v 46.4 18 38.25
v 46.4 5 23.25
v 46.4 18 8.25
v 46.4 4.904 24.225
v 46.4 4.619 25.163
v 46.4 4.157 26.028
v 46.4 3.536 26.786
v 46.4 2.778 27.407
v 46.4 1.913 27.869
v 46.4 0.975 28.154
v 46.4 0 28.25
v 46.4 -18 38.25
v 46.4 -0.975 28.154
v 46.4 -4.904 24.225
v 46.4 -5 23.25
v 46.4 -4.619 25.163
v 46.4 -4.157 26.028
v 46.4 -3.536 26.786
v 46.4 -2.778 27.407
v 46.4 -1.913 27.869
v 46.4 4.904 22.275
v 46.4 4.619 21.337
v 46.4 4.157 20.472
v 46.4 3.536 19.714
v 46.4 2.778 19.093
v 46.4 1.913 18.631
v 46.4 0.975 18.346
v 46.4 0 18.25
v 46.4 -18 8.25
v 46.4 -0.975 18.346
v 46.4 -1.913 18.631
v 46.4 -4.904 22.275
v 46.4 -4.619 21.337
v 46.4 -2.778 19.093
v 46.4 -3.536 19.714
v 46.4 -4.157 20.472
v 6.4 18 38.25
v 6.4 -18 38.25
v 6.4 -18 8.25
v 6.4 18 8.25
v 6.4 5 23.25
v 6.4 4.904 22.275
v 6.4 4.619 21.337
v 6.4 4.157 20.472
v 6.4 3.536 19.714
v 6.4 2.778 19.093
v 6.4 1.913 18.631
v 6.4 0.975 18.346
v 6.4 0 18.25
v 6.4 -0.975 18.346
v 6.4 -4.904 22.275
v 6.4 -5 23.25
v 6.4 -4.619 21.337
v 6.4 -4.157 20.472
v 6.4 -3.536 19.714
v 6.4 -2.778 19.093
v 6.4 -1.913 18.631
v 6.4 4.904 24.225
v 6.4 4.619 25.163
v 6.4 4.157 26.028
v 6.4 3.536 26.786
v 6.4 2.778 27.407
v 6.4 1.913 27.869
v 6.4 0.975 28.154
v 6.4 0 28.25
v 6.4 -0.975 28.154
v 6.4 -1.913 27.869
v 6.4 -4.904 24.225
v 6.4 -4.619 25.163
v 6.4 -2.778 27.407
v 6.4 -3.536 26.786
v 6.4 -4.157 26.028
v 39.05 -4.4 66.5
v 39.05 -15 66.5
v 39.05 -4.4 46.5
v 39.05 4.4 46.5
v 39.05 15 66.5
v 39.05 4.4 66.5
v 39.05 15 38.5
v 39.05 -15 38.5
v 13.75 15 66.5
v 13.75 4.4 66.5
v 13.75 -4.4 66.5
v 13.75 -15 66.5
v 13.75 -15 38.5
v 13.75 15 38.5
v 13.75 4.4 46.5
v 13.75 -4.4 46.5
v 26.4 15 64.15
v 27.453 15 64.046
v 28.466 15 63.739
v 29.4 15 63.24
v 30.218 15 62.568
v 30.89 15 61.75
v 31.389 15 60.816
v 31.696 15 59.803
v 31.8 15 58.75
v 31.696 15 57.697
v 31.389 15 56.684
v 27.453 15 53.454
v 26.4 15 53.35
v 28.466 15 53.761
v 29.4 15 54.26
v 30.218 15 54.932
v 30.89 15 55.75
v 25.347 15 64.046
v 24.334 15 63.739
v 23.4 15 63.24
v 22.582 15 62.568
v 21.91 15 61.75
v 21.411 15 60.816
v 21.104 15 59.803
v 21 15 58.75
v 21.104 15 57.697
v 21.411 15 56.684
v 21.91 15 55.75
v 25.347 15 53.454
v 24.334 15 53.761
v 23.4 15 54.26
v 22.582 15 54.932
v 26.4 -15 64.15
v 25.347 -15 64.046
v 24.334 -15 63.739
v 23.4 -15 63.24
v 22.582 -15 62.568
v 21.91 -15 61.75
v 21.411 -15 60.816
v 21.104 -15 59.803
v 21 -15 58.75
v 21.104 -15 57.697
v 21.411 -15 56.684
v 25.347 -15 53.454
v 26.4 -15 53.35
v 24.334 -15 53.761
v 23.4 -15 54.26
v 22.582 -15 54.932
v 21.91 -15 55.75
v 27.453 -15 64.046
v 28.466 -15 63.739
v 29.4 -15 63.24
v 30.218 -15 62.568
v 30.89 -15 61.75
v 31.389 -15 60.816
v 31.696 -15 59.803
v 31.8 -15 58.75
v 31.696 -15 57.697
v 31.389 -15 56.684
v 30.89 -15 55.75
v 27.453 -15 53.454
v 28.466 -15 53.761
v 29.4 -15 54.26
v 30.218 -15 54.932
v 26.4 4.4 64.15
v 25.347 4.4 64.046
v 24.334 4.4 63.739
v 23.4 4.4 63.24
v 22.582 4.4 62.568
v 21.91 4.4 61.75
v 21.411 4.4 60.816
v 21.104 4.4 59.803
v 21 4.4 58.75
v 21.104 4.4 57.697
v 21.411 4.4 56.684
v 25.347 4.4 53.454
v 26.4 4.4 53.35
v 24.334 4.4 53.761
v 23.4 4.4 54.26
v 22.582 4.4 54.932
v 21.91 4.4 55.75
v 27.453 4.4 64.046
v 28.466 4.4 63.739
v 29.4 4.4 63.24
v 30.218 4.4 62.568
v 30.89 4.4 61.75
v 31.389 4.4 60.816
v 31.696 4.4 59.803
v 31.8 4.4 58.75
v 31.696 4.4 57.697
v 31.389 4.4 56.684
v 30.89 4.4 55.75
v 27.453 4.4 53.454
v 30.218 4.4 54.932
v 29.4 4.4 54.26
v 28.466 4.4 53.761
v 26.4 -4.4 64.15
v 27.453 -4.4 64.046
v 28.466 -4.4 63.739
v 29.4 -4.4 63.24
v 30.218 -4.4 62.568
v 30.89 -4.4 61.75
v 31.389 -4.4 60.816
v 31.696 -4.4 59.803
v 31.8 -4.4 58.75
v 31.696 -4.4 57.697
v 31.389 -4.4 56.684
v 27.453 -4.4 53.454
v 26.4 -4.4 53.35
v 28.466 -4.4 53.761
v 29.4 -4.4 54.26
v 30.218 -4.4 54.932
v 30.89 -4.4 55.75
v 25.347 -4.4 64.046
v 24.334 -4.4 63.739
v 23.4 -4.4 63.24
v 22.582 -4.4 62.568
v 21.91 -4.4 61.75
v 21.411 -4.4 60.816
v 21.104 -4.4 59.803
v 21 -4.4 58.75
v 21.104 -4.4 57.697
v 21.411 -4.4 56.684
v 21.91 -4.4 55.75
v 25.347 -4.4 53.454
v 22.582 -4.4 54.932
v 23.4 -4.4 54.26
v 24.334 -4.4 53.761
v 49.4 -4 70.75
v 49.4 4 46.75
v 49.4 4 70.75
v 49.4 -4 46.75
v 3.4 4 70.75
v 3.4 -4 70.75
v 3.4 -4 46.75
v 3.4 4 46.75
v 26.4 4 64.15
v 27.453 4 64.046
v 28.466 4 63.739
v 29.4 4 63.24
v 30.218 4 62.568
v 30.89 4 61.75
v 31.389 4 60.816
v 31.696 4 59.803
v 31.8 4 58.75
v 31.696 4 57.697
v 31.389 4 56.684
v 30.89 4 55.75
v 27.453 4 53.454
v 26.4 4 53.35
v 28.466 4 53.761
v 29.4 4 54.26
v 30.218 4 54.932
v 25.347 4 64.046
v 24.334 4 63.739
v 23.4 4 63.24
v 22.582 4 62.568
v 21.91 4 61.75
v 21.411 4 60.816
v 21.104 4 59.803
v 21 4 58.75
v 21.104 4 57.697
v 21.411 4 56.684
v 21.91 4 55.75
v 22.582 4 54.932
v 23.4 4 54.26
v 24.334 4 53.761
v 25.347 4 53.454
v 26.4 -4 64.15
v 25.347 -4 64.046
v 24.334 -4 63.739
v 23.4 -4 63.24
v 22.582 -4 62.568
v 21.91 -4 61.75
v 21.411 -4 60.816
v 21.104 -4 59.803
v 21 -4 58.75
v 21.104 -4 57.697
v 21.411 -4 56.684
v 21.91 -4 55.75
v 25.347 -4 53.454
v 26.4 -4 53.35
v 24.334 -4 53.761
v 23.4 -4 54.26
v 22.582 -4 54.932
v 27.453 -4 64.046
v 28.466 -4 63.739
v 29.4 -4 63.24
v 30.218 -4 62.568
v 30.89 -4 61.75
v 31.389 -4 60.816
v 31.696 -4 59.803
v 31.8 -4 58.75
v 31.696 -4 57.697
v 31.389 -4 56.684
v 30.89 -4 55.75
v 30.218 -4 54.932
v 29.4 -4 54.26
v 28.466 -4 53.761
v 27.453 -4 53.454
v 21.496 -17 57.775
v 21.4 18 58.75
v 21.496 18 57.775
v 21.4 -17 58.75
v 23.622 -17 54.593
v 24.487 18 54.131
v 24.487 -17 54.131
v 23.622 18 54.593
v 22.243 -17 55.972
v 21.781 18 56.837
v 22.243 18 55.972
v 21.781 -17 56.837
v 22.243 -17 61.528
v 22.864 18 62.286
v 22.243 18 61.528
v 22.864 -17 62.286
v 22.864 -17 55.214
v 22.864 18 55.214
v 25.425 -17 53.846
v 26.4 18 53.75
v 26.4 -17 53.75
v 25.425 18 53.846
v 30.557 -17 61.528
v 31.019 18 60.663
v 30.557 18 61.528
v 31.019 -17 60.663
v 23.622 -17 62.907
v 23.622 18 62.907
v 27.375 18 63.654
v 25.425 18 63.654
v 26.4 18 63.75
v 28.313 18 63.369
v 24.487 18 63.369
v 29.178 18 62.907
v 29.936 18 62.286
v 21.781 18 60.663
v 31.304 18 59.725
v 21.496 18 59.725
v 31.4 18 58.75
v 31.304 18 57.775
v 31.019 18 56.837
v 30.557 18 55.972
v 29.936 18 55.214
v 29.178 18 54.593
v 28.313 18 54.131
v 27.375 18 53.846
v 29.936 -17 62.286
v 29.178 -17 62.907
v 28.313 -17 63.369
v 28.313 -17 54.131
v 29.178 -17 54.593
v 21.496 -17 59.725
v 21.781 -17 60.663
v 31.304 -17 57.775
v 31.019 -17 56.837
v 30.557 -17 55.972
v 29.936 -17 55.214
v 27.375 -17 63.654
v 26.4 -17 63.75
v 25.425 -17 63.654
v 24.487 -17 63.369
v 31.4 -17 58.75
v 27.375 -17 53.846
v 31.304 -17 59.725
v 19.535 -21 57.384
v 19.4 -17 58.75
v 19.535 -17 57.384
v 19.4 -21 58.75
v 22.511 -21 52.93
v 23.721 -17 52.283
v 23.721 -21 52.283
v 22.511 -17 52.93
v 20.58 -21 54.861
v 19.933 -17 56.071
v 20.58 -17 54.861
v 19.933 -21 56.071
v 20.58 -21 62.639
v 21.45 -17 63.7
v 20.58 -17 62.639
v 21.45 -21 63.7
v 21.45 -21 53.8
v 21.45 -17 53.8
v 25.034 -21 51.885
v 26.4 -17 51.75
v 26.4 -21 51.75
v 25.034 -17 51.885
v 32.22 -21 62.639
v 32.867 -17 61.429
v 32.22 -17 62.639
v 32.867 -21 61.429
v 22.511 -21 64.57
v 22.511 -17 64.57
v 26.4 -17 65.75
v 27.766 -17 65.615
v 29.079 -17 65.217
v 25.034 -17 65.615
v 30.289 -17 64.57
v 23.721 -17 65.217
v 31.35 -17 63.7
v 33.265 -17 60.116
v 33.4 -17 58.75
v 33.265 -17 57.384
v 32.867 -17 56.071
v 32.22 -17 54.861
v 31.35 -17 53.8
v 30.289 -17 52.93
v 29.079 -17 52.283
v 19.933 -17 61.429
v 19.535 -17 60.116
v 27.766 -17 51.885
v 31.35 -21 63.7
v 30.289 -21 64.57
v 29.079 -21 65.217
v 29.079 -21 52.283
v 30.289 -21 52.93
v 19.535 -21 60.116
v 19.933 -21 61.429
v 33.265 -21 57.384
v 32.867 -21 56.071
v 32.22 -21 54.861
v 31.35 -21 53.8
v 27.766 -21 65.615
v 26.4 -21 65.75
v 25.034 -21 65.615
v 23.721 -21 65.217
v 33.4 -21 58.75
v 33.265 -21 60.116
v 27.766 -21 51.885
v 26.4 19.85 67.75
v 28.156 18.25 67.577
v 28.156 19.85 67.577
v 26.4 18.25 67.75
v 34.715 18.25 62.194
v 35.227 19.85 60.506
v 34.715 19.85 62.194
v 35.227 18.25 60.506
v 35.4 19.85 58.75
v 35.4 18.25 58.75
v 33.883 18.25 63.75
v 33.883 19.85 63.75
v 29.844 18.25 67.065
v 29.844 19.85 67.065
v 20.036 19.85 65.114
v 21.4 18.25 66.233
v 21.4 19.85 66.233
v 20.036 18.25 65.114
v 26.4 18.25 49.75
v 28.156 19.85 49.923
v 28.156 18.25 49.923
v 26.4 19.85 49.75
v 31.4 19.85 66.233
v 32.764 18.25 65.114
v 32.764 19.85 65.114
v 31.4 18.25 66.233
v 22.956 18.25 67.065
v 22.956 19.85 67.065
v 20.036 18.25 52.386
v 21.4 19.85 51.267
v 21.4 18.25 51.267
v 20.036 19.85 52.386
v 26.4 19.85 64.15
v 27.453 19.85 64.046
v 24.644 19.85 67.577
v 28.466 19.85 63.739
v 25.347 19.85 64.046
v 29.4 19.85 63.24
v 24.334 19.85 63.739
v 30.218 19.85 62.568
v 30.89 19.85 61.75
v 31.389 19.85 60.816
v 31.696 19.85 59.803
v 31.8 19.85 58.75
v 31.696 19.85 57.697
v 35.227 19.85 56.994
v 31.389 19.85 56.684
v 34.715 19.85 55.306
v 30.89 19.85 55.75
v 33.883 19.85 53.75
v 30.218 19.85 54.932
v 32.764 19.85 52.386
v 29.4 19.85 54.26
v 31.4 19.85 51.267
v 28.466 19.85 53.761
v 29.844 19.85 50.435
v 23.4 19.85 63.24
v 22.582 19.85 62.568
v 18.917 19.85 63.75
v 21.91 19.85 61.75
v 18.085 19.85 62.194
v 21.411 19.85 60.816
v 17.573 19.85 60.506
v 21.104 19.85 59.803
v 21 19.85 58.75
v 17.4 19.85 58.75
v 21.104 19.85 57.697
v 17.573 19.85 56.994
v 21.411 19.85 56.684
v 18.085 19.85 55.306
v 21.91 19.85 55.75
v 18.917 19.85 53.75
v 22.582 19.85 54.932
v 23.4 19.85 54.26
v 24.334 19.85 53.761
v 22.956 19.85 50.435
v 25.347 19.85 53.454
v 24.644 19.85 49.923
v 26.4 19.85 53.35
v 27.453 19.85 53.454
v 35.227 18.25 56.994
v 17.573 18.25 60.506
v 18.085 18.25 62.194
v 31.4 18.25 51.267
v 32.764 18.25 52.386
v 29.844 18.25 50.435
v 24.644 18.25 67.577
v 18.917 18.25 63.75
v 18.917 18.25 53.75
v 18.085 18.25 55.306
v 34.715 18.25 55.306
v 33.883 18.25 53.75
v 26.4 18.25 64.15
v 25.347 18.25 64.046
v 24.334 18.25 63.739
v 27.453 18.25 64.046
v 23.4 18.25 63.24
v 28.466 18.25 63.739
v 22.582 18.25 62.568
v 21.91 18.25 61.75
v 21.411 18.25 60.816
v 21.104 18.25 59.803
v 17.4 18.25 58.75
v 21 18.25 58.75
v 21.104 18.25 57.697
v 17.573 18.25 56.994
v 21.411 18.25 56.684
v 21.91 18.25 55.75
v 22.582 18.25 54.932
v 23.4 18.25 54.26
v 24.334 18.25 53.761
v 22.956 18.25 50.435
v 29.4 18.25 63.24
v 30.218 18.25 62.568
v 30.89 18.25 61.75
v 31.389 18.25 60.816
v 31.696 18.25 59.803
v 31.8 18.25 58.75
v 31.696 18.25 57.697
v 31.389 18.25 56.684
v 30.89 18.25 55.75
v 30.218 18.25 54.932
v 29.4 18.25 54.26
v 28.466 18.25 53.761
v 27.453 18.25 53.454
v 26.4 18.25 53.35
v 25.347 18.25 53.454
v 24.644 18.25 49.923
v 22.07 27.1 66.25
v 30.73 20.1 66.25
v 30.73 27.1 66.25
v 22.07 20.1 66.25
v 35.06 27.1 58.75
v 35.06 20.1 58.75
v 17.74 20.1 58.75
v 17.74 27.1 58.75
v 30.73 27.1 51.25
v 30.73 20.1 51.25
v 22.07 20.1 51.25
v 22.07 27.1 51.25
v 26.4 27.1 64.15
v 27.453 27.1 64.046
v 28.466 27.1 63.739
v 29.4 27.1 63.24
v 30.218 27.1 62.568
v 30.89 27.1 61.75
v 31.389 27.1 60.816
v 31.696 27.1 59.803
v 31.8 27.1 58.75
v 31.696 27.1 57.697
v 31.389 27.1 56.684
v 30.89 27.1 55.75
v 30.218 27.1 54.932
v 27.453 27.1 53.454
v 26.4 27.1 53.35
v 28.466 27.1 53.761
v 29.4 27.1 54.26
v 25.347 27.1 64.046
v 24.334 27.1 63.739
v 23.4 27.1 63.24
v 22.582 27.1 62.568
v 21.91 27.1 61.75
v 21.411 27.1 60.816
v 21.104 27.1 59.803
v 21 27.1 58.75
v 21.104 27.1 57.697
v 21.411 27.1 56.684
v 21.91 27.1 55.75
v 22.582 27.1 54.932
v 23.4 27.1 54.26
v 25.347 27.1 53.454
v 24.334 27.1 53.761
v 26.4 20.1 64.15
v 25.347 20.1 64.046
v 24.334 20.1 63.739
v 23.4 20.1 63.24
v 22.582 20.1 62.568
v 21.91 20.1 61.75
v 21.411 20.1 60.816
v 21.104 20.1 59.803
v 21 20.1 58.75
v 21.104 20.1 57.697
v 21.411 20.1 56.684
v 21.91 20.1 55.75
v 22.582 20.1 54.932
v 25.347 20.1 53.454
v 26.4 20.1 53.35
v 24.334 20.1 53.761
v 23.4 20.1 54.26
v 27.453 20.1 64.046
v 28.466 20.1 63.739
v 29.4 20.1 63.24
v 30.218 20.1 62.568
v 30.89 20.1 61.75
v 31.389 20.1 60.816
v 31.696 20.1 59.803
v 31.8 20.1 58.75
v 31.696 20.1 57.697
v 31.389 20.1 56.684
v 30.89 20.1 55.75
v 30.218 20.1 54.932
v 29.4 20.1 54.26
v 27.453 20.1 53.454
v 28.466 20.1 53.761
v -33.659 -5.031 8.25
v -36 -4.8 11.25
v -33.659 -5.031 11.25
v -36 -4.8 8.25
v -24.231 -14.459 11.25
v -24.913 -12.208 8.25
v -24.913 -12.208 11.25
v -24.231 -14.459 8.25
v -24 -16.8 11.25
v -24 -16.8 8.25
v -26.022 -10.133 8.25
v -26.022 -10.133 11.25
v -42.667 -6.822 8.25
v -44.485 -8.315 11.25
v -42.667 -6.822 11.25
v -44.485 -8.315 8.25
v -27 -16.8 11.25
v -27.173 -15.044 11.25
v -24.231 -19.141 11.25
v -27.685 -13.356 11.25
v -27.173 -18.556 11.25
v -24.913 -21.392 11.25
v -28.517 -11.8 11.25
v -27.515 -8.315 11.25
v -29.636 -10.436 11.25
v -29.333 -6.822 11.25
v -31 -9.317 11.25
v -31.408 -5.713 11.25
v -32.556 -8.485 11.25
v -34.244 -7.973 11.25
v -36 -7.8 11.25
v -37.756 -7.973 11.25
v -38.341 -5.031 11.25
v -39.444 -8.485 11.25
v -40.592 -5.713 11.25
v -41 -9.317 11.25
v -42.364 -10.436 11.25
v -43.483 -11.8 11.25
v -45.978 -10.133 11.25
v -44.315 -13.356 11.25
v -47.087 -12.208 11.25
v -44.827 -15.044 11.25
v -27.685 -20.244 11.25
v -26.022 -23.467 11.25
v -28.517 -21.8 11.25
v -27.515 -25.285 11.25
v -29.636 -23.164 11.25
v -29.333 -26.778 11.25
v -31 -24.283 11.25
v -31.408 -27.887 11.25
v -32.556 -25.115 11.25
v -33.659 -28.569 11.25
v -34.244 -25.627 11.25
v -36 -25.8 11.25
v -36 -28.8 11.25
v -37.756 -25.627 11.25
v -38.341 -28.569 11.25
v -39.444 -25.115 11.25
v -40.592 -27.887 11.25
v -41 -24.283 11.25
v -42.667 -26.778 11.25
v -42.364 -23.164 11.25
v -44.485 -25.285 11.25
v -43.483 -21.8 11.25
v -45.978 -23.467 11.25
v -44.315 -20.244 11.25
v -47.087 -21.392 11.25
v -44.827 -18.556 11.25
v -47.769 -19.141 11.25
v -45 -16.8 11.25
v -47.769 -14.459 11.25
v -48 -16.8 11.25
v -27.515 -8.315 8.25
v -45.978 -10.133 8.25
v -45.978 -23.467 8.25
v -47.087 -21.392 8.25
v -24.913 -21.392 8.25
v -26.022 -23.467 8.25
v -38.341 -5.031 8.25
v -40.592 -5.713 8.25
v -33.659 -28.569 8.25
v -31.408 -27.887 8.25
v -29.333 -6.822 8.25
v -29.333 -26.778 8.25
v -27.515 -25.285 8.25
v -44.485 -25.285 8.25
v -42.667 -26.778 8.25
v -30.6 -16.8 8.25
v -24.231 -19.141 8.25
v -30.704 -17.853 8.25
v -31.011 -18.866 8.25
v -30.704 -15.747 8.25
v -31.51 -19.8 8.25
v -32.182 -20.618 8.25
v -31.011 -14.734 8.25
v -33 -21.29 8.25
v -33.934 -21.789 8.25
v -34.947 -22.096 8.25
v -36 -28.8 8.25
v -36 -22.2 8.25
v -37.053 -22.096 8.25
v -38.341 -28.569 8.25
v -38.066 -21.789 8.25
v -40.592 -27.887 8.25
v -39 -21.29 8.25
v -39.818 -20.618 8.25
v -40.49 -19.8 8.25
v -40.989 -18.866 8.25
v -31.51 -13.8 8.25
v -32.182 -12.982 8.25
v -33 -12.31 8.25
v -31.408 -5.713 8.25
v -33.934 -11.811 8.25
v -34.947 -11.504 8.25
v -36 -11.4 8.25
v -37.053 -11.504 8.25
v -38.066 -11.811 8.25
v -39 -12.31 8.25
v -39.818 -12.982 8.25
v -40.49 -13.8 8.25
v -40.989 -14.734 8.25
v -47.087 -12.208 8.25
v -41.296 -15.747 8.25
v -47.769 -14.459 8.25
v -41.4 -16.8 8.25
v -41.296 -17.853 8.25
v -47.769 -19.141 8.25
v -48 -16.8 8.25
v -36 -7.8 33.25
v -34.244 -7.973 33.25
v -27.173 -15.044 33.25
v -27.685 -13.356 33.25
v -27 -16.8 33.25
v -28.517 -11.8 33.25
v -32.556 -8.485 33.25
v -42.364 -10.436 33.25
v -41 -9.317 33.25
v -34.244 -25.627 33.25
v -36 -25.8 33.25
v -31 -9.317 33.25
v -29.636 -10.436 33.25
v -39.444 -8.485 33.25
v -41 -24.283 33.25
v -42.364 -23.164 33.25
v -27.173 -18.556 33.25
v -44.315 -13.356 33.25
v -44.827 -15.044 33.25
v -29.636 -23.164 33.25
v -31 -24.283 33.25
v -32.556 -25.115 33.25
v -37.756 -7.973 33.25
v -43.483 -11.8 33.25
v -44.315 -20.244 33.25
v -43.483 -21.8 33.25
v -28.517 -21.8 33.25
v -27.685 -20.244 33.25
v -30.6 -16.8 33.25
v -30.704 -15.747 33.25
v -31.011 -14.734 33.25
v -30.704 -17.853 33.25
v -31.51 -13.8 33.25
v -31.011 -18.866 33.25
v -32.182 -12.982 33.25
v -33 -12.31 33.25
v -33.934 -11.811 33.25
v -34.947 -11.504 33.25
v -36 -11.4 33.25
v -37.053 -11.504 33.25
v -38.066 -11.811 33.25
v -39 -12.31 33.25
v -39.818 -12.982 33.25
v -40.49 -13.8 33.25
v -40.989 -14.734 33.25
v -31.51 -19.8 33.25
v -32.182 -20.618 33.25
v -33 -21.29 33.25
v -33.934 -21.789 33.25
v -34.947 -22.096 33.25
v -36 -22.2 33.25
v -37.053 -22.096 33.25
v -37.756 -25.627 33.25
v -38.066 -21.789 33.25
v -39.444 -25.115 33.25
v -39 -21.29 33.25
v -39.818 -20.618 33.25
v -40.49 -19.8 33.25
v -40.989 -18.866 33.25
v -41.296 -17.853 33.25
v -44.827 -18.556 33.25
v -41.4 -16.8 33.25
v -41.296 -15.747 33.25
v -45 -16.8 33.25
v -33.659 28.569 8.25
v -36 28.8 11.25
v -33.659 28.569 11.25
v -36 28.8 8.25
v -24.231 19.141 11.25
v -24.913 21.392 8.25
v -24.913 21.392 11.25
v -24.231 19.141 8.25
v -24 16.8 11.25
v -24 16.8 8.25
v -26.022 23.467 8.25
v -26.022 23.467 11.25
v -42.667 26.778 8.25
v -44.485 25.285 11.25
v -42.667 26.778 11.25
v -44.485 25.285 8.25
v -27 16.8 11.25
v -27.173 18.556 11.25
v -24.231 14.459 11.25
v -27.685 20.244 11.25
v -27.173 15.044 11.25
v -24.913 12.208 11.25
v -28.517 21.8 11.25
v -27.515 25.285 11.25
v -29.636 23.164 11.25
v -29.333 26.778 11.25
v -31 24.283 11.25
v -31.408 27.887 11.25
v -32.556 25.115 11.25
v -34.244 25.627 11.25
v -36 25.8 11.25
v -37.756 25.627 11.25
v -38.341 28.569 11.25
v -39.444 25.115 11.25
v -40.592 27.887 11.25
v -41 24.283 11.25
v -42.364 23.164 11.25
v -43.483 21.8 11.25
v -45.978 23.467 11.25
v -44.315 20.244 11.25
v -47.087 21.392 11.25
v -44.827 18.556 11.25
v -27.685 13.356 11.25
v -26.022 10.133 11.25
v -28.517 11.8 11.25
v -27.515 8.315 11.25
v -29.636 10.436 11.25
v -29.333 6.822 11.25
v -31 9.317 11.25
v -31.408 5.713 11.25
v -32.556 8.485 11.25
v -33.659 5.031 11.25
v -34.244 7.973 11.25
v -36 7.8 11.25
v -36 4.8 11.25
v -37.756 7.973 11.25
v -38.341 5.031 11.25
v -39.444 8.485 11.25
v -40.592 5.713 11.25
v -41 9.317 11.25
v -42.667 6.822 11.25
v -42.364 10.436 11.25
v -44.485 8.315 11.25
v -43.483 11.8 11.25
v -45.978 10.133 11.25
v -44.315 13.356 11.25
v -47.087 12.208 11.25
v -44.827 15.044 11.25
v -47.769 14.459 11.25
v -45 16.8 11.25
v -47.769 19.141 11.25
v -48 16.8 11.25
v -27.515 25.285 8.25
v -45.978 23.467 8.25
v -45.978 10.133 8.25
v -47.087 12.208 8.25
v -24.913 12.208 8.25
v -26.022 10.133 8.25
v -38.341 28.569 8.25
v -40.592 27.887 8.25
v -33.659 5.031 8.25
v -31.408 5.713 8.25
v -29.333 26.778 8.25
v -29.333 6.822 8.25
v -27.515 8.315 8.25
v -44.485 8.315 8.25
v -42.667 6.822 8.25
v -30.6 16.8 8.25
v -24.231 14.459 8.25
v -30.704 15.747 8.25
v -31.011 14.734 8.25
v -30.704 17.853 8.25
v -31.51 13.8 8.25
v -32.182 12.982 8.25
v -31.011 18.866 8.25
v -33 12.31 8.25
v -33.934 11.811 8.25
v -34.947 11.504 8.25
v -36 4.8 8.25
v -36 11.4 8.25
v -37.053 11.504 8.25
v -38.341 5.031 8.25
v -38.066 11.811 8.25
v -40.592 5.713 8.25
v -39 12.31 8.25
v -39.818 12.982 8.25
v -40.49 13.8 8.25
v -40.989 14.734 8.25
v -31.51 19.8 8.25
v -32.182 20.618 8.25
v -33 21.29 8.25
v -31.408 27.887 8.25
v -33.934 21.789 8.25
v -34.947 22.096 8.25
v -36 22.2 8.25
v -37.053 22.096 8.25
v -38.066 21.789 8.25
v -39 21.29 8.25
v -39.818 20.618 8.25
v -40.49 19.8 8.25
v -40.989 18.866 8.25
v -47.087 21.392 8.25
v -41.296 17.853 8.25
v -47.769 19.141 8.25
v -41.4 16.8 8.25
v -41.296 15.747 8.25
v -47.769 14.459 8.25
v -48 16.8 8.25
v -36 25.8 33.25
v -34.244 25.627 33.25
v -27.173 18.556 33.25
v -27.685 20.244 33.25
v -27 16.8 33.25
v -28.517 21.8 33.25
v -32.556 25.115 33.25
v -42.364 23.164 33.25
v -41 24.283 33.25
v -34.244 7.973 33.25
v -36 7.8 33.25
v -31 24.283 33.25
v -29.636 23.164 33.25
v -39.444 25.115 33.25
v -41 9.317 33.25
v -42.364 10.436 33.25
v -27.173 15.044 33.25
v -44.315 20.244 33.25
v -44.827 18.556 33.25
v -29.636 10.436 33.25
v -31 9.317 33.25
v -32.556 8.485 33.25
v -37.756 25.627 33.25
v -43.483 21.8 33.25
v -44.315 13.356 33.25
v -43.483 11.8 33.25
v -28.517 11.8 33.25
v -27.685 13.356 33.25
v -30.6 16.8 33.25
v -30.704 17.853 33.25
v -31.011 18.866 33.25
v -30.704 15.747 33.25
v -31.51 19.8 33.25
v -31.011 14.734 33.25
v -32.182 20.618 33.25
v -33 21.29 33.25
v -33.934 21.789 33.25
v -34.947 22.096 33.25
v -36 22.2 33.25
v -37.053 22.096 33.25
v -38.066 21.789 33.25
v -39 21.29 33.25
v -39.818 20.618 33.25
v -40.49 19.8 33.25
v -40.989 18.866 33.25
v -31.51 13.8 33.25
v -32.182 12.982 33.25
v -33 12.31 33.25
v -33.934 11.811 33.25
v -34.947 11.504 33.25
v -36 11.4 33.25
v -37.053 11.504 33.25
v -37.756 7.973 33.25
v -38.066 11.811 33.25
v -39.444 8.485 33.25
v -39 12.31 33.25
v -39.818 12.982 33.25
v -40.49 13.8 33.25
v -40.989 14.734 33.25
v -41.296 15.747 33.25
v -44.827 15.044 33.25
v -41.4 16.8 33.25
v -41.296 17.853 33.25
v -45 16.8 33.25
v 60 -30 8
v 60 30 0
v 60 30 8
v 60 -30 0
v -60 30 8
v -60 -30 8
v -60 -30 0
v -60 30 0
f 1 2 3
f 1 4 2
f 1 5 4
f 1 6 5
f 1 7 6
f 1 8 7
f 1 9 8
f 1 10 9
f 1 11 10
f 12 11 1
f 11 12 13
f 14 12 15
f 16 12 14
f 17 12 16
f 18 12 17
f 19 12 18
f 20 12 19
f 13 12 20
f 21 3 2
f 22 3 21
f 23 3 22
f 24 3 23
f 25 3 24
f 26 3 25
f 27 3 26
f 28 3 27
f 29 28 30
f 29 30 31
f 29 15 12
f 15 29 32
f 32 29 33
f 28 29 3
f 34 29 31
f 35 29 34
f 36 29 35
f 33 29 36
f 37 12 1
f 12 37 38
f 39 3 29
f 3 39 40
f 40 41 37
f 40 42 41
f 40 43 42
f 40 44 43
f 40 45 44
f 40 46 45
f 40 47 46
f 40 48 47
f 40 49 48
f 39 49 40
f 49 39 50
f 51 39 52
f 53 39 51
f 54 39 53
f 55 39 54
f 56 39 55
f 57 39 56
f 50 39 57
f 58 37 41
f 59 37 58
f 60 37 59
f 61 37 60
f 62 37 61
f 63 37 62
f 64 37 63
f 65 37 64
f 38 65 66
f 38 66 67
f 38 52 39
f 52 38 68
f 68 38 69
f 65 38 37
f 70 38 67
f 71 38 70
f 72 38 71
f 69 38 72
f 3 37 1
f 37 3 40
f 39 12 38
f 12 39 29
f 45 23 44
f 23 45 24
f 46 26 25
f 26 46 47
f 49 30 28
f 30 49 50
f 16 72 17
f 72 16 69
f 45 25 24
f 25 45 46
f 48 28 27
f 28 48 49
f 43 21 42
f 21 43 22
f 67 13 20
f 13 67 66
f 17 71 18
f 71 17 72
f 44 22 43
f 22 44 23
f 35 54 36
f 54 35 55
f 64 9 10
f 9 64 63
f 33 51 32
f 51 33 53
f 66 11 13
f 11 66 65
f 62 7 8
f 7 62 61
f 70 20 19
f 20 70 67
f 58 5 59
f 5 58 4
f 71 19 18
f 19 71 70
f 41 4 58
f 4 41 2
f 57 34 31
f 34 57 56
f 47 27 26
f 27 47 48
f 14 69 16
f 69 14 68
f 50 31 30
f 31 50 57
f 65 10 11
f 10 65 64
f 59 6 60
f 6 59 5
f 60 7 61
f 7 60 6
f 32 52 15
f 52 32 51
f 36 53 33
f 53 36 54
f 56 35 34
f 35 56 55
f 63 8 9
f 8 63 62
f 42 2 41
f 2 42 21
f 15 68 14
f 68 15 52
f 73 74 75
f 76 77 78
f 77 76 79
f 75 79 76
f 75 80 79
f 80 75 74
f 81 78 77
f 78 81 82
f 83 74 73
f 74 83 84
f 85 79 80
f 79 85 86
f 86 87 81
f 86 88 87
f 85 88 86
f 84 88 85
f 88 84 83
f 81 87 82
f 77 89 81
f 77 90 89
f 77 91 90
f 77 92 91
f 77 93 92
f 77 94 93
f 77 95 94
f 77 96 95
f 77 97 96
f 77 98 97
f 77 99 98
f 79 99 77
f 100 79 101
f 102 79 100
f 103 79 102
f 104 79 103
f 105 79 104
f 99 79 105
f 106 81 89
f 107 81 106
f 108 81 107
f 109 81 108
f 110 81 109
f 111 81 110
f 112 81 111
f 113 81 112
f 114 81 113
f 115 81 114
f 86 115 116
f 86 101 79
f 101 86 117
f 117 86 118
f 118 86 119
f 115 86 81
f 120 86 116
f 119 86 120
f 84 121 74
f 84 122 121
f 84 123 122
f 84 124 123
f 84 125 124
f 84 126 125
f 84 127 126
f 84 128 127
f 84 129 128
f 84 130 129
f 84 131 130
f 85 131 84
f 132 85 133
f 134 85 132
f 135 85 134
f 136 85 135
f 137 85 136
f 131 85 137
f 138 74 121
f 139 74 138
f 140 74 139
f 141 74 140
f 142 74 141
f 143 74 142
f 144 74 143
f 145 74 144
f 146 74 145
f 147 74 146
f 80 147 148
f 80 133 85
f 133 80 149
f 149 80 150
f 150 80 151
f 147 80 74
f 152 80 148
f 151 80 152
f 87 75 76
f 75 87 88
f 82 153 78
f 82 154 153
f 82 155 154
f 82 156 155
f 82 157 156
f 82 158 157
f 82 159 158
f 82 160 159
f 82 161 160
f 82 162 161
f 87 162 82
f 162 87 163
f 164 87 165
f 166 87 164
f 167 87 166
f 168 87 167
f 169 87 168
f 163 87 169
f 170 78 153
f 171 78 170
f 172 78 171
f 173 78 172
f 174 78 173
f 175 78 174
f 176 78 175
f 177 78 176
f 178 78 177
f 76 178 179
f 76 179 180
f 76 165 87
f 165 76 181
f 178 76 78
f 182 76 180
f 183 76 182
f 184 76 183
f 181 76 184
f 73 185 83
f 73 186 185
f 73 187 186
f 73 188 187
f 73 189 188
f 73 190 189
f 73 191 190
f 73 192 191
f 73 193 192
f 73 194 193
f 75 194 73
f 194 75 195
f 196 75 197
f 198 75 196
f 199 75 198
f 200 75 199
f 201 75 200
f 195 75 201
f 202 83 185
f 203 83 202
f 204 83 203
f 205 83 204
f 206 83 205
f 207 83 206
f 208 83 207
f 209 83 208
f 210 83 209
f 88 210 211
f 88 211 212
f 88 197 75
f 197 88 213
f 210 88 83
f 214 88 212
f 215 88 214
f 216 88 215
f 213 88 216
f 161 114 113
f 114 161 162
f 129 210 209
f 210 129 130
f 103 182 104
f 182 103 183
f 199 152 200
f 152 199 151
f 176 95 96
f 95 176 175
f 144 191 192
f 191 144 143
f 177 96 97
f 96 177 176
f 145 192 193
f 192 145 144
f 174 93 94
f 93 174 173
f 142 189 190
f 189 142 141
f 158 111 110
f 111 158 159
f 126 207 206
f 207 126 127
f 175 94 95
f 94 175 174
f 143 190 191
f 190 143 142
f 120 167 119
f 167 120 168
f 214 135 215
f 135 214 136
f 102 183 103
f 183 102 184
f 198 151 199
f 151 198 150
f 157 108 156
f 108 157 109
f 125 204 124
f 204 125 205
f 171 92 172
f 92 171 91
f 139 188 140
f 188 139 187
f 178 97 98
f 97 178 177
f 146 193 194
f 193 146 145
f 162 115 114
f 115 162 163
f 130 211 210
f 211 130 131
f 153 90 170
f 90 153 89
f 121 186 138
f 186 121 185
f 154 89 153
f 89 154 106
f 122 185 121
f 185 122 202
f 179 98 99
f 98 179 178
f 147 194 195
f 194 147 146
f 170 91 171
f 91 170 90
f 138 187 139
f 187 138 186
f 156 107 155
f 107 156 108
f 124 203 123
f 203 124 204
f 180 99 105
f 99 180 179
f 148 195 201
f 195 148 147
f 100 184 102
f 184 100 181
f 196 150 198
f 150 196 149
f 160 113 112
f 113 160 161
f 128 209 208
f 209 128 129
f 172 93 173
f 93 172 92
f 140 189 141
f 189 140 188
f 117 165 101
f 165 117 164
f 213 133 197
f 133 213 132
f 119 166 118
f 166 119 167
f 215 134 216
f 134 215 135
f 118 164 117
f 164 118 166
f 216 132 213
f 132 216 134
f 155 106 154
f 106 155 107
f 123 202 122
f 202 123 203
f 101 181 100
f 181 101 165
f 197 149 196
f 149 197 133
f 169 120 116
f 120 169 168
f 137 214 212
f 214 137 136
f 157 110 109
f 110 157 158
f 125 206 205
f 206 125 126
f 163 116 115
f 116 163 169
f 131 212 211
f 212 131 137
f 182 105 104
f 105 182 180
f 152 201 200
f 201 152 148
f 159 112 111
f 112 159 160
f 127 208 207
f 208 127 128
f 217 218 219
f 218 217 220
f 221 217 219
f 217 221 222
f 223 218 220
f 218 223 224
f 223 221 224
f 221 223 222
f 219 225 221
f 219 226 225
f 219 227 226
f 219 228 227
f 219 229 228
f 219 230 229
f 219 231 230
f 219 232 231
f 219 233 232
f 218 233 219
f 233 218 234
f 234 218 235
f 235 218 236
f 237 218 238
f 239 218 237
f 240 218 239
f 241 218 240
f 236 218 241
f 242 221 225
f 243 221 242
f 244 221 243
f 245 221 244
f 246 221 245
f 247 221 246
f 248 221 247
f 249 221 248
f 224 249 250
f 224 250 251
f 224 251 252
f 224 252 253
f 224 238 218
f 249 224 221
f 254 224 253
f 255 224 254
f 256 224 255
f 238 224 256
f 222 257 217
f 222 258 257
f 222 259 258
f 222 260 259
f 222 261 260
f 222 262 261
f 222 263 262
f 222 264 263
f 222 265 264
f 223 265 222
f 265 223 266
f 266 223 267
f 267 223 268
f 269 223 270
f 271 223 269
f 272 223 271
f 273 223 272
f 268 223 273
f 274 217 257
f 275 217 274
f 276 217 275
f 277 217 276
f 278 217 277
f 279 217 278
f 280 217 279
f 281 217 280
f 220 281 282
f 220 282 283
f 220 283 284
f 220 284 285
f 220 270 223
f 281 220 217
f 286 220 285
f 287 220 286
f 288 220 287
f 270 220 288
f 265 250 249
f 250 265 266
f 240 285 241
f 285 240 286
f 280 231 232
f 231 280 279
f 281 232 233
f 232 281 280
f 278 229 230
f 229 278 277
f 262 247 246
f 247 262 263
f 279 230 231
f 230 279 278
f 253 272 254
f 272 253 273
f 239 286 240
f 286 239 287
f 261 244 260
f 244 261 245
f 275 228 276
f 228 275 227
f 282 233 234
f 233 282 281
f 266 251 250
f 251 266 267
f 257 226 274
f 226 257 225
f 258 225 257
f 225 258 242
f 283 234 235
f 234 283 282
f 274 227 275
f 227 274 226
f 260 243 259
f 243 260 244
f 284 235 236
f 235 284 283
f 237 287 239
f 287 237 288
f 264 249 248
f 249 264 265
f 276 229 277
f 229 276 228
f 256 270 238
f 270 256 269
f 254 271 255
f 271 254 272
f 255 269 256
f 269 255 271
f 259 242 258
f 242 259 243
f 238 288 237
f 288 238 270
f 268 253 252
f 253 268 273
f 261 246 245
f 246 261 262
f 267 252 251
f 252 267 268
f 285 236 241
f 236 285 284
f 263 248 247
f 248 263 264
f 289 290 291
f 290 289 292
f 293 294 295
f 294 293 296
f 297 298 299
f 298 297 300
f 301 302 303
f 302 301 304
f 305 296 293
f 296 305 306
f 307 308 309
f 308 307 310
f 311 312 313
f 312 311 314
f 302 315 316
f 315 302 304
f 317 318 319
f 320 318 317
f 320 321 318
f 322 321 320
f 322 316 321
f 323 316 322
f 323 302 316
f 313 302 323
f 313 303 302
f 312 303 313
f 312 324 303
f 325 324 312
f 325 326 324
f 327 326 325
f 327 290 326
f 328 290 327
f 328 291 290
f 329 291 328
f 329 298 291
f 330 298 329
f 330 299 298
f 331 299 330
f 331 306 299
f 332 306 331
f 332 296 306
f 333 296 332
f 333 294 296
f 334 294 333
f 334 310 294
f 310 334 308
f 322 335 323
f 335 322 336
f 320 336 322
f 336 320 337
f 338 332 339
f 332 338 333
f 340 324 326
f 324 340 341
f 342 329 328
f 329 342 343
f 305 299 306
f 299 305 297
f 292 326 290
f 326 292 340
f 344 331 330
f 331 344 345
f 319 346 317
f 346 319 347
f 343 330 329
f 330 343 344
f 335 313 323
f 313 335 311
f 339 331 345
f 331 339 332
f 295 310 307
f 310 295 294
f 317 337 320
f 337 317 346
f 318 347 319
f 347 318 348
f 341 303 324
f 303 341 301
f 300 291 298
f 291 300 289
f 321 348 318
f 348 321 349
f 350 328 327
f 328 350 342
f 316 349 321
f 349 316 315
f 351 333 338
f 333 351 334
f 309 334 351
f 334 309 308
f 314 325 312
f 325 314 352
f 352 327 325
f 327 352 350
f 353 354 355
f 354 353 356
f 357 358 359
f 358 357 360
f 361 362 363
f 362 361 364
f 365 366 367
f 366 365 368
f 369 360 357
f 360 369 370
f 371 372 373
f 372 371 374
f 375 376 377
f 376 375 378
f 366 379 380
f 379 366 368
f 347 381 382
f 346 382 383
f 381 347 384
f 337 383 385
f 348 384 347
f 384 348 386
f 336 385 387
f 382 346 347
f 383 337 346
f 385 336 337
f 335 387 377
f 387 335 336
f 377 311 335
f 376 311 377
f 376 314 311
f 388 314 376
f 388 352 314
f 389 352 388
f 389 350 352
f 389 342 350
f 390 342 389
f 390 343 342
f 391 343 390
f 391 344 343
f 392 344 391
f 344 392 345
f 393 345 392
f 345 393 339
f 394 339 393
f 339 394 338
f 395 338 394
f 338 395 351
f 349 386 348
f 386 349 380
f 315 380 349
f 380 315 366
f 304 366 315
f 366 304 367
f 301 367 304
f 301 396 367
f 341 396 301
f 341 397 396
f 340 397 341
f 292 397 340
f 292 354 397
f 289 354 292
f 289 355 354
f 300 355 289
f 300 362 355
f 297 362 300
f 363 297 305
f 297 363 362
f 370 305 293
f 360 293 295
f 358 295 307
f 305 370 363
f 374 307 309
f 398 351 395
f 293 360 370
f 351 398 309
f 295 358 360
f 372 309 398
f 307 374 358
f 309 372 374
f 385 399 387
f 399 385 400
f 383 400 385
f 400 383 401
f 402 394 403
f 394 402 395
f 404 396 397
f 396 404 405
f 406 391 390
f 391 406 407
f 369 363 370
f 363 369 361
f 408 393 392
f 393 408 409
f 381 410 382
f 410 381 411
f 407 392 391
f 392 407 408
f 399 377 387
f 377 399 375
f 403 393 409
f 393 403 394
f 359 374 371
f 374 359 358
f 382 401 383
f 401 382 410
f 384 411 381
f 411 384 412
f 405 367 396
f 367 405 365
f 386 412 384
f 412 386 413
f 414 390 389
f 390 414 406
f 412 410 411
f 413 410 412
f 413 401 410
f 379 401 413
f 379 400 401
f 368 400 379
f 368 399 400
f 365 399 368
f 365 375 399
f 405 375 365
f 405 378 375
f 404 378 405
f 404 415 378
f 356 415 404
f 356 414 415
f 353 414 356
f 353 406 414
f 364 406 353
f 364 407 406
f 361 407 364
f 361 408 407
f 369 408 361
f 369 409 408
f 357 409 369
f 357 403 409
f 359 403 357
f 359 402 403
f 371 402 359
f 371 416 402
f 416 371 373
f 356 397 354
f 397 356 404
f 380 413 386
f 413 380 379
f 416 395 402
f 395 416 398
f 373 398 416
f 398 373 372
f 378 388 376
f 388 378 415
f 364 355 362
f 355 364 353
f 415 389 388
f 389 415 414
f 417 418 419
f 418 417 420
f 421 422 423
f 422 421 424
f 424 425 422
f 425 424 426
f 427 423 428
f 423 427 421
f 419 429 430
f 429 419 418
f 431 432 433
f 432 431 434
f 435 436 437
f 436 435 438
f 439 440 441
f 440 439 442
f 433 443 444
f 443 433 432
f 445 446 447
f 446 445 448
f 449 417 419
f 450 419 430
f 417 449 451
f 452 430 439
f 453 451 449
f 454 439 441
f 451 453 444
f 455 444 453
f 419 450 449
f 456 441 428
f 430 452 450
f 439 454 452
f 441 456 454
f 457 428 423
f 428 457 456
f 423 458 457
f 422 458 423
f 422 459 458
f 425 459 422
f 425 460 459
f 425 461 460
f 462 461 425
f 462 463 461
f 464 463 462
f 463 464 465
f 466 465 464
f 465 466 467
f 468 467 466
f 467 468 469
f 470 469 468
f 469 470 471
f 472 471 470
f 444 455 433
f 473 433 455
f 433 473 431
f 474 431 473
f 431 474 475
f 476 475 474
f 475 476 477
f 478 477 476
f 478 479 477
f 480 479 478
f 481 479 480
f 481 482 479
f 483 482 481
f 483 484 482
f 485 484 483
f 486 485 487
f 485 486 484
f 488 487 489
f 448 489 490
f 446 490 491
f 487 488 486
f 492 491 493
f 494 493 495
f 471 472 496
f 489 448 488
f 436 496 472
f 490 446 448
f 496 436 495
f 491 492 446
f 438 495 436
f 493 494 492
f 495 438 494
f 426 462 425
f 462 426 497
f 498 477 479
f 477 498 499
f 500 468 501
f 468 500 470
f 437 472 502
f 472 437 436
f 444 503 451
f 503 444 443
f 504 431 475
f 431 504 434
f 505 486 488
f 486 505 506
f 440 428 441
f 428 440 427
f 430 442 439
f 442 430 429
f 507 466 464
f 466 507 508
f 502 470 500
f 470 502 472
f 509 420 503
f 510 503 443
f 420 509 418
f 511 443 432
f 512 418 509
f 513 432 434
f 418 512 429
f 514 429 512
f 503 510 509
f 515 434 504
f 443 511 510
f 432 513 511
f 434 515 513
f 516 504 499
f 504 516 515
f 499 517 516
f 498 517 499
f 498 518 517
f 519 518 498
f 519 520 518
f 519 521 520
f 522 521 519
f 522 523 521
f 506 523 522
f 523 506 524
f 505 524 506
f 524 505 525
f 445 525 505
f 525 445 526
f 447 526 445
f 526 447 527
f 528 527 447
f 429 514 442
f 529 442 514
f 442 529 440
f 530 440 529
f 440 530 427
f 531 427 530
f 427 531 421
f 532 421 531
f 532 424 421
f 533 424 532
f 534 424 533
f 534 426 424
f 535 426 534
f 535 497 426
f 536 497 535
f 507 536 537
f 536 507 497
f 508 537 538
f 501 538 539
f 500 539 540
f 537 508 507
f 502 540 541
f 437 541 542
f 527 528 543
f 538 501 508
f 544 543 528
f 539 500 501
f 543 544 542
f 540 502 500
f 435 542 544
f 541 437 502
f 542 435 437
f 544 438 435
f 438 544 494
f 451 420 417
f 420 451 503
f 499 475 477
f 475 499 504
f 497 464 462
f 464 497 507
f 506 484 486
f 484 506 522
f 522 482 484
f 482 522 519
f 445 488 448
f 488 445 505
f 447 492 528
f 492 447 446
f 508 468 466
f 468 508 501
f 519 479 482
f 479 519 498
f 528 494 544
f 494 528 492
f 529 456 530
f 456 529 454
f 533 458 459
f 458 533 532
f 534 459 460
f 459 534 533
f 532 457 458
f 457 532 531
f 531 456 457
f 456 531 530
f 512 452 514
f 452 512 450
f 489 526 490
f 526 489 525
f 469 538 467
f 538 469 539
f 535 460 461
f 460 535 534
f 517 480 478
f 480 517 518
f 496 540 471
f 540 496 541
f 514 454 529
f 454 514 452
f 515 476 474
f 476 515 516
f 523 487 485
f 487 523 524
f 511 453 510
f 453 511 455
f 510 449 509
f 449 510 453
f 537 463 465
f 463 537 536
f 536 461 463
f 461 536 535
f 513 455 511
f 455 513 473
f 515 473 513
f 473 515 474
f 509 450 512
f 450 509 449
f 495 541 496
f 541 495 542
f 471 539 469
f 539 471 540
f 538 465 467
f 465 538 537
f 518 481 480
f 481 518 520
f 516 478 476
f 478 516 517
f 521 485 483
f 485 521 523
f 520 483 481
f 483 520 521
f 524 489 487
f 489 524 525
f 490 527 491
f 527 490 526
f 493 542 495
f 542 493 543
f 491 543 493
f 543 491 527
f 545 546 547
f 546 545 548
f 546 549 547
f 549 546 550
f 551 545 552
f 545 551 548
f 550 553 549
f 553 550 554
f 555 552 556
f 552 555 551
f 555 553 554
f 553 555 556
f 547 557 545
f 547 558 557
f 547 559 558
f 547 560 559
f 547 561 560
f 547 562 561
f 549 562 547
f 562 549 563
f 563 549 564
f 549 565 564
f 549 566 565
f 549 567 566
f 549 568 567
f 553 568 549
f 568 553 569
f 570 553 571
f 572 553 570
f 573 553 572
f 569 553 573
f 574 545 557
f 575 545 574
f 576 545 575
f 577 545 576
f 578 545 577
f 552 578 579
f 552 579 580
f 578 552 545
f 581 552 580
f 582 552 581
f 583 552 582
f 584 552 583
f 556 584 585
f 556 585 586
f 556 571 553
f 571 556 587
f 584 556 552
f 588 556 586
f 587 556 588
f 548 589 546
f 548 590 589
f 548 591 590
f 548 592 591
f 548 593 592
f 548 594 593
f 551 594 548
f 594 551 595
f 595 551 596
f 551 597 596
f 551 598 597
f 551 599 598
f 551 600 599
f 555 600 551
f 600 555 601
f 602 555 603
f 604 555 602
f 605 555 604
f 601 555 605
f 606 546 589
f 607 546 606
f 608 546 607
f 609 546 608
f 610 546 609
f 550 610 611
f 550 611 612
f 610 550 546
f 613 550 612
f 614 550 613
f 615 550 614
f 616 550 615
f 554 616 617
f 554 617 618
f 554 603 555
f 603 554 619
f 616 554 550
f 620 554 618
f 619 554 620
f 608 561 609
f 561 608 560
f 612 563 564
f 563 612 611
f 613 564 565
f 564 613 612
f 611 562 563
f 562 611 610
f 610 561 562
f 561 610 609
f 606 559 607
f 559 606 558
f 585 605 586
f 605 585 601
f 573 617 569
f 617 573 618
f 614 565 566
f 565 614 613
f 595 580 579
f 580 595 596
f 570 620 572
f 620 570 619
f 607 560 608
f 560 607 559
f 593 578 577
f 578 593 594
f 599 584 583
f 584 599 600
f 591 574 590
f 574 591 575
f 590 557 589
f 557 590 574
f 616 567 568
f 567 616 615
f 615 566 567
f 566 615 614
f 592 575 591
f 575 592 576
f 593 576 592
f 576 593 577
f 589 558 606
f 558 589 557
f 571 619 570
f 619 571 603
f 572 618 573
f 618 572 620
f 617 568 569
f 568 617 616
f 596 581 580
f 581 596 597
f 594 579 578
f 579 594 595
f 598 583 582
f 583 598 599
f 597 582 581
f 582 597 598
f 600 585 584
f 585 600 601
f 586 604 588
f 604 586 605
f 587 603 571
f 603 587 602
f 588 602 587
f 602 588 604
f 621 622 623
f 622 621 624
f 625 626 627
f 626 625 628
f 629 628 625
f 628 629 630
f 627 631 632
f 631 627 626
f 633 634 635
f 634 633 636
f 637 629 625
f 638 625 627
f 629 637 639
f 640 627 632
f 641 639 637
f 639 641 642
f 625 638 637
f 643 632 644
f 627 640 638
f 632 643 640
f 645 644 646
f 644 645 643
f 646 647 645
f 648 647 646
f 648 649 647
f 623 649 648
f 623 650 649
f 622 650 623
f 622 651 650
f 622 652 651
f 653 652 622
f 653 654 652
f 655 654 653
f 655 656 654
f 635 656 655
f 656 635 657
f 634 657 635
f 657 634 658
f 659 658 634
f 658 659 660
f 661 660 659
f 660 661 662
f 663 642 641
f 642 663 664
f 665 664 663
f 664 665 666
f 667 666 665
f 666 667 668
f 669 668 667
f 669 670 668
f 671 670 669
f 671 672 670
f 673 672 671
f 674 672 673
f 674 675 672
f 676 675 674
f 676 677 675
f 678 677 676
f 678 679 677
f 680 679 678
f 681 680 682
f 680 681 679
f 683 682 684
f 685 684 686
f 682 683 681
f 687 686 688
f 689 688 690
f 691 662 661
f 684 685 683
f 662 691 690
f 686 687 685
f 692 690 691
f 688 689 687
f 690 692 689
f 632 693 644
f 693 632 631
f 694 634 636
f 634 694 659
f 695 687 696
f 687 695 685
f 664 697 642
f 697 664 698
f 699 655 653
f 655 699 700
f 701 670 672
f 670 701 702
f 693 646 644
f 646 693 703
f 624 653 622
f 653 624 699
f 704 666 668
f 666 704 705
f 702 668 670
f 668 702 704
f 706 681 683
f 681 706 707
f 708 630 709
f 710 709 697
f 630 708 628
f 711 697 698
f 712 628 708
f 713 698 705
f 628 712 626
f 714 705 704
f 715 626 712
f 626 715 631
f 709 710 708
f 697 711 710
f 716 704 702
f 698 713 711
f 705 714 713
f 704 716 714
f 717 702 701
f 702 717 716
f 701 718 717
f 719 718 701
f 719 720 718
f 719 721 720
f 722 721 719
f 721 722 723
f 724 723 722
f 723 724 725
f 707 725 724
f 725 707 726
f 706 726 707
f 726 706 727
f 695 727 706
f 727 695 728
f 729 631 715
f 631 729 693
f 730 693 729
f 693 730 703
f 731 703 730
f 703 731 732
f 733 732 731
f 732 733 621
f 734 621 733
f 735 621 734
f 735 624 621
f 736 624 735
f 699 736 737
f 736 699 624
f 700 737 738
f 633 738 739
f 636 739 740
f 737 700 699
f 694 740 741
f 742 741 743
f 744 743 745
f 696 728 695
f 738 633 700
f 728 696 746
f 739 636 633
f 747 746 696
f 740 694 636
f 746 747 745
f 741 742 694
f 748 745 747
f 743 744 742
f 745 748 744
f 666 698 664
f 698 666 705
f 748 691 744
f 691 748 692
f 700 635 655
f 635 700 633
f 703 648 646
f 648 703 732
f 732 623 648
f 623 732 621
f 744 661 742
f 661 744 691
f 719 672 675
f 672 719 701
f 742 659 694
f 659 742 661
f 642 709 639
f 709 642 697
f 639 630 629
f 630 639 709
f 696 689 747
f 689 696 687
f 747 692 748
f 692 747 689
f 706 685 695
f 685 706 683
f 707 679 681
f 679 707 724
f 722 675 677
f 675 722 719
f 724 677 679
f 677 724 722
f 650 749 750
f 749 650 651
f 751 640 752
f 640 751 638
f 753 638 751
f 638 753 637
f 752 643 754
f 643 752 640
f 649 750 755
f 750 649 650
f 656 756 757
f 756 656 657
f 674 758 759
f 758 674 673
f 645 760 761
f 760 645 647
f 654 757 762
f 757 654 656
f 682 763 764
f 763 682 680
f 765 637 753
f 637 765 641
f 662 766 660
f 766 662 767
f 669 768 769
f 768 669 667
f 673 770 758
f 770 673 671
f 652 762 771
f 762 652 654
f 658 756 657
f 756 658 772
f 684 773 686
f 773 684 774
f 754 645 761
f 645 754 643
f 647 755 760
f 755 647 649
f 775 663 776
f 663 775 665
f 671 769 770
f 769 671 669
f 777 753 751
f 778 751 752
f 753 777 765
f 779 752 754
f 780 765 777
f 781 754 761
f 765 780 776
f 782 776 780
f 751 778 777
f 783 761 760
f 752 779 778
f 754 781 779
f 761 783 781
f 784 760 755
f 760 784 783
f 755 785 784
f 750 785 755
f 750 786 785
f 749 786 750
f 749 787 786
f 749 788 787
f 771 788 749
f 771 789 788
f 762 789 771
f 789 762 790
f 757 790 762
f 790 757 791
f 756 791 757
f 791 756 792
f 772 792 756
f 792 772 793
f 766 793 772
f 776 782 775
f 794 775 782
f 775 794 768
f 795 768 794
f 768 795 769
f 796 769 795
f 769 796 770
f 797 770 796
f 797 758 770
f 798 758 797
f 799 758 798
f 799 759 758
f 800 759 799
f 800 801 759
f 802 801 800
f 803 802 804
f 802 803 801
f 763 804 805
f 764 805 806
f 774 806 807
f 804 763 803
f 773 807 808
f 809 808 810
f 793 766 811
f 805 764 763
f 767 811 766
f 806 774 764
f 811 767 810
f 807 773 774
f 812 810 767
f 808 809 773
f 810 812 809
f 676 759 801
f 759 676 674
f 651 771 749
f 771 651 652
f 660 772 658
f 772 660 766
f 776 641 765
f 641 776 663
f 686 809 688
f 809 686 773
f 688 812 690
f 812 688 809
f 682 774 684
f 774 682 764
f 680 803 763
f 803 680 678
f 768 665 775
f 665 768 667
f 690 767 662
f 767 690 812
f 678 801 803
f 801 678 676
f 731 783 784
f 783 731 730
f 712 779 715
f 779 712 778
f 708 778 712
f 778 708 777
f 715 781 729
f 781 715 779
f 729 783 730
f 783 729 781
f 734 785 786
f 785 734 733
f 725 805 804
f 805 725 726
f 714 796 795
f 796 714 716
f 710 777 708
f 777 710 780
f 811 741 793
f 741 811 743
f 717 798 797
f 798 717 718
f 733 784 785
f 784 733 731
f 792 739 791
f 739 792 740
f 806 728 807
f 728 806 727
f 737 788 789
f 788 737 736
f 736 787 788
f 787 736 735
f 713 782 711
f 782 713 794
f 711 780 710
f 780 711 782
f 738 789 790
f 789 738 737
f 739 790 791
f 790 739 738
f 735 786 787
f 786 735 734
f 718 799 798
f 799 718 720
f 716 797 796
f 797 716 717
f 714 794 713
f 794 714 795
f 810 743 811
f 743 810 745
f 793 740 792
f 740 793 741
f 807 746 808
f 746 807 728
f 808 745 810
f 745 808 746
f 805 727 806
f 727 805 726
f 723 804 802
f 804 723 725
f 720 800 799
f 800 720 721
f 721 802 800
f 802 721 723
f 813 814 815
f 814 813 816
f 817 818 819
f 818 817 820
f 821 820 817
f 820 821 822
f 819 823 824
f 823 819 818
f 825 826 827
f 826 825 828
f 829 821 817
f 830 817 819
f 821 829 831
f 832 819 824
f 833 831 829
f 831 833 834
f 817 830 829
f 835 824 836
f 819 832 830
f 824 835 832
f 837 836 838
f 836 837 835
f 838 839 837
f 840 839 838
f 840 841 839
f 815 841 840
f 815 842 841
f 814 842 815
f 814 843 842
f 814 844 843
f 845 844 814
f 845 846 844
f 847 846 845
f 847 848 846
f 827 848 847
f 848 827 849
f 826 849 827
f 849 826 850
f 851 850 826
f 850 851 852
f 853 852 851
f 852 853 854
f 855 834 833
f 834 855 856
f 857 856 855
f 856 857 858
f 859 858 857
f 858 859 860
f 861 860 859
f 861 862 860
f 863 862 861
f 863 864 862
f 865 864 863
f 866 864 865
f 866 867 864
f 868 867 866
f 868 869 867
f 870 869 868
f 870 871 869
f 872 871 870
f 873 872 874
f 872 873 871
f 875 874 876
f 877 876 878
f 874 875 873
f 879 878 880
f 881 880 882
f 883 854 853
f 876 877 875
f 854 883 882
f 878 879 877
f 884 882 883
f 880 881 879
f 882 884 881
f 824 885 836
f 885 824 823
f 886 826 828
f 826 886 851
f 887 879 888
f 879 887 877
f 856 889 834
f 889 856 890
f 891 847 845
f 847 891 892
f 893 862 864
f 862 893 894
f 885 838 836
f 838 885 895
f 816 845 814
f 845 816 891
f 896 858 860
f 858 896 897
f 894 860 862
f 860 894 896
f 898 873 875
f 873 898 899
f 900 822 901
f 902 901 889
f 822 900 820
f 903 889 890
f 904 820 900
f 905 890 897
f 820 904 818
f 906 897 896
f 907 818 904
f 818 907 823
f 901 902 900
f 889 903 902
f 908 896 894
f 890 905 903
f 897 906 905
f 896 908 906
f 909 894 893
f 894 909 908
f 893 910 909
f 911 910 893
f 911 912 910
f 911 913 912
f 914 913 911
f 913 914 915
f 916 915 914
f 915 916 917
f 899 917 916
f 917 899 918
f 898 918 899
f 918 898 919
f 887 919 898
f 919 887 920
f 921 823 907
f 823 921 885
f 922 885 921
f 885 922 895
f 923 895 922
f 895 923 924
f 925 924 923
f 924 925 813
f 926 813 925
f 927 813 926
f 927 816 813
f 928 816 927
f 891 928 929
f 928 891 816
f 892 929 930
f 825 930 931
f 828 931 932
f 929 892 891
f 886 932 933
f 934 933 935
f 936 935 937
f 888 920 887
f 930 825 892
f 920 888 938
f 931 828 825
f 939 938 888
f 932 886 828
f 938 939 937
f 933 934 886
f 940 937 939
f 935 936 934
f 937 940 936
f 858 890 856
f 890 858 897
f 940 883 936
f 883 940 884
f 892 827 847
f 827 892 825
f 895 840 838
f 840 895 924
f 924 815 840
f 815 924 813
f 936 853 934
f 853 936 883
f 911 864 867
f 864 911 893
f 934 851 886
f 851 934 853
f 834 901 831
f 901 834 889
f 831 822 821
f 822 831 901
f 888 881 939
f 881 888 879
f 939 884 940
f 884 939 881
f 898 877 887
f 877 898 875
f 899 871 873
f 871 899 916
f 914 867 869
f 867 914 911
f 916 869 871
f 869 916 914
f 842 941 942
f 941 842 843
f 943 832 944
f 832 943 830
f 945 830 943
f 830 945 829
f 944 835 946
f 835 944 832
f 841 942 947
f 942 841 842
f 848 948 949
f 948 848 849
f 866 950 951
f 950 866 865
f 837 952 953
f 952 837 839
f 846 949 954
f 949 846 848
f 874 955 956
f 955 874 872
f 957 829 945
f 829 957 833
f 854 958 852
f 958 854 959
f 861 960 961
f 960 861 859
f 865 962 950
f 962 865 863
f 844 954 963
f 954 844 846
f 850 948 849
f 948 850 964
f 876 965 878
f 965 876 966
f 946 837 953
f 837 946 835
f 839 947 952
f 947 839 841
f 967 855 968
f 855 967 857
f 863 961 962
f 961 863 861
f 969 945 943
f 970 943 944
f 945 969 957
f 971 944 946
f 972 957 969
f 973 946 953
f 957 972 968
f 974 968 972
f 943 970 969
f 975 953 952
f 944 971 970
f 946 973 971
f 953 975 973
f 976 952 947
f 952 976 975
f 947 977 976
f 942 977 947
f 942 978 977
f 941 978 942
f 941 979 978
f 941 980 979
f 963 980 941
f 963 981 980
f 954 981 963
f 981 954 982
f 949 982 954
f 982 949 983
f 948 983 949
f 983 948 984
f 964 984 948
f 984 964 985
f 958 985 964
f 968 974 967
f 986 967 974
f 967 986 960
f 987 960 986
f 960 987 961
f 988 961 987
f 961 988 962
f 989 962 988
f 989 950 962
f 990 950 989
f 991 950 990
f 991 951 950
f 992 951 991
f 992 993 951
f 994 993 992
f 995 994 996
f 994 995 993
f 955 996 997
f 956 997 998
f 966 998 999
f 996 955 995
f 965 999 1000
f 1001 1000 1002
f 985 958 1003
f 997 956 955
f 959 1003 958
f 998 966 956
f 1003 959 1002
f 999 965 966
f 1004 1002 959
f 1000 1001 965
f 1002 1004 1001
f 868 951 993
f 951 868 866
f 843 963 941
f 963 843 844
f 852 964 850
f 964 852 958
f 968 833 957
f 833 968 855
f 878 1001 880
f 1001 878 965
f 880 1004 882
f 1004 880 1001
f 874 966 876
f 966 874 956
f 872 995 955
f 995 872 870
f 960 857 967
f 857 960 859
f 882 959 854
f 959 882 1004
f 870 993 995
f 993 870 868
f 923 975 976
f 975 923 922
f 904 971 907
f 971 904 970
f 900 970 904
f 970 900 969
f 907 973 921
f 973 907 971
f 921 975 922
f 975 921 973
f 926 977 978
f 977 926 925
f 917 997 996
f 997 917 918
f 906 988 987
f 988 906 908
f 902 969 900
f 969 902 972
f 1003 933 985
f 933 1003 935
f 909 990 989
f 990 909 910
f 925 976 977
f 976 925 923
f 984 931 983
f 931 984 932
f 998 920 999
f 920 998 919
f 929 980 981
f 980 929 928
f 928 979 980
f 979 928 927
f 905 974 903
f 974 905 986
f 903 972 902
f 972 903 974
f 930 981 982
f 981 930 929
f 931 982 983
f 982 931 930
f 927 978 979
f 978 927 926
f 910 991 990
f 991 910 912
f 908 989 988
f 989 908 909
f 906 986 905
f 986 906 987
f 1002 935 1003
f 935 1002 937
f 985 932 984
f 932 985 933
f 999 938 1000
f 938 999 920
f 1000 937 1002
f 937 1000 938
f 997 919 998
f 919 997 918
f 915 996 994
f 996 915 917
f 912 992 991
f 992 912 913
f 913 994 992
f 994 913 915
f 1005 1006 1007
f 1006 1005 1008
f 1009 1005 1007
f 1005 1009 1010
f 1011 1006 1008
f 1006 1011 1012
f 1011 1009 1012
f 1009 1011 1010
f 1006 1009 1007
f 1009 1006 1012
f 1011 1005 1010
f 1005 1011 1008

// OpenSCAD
$fn = 32;

// ------------------------------------------------------------------------
// Indexing jig: plate 120 x 60 mm, pin d10
// Every part is its own module, assembly() places every instance.
// ------------------------------------------------------------------------

// --- part 1 ---
module jig_plate() {
  difference() {
    translate([-60, -30, 0]) cube([120, 60, 8]);
  }
}

// --- part 2 ---
module locator_block() {
  difference() {
    translate([-20, -18, 0]) cube([40, 36, 30]);
    translate([0, 0, 15]) rotate([0, 90, 0]) cylinder(h = 42, d = 10, center = true);
  }
}

// --- part 3 ---
module index_fork() {
  difference() {
    translate([-12.65, -15, 0]) cube([25.3, 30, 28]);
    translate([-13.65, -4.4, 8]) cube([27.3, 8.8, 21]);
    translate([0, 0, 20.25]) rotate([90, 0, 0]) cylinder(h = 32, d = 10.8, center = true);
  }
}

// --- part 4 ---
module index_arm() {
  difference() {
    translate([-23, -4, 0]) cube([46, 8, 24]);
    translate([0, 0, 12]) rotate([90, 0, 0]) cylinder(h = 10, d = 10.8, center = true);
  }
}

// --- part 5 ---
module index_pin() {
  rotate([0, 90, 0]) cylinder(h = 36, d = 10, center = true);
  translate([-21, 0, 0]) rotate([0, 90, 0]) cylinder(h = 4, d = 14);
}

// --- part 6 ---
module pin_washer() {
  difference() {
      translate([0, 0, 0]) cylinder(h = 1.6, d = 18);
      translate([0, 0, -1]) cylinder(h = 3.6, d = 10.8);
    }
}

// --- part 7 ---
module lock_nut() {
  difference() {
    linear_extrude(height = 7) polygon(points = [[8.66, 0], [4.33, 7.5], [-4.33, 7.5], [-8.66, 0], [-4.33, -7.5], [4.33, -7.5]]);
    translate([0, 0, -1]) cylinder(h = 9, d = 10.8);
  }
}

// --- part 8 ---
module guide_bush_a() {
  difference() {
    union() {
      cylinder(h = 3, d = 24);
      translate([0, 0, 3]) cylinder(h = 22, d = 18);
    }
    translate([0, 0, -1]) cylinder(h = 27, d = 10.8);
  }
}

// --- part 9 ---
module guide_bush_b() {
  difference() {
    union() {
      cylinder(h = 3, d = 24);
      translate([0, 0, 3]) cylinder(h = 22, d = 18);
    }
    translate([0, 0, -1]) cylinder(h = 27, d = 10.8);
  }
}

// --- assembly ---
module assembly() {
  color([0.80, 0.24, 0.20]) translate([0, 0, 0]) rotate([0, 0, 0]) jig_plate();
  color([0.20, 0.45, 0.75]) translate([26.4, 0, 8.25]) rotate([0, 0, 0]) locator_block();
  color([0.25, 0.62, 0.32]) translate([26.4, 0, 38.5]) rotate([0, 0, 0]) index_fork();
  color([0.92, 0.70, 0.18]) translate([26.4, 0, 46.75]) rotate([0, 0, 0]) index_arm();
  color([0.58, 0.35, 0.70]) translate([26.4, 0, 58.75]) rotate([0, 0, 90]) index_pin();
  color([0.16, 0.66, 0.66]) translate([26.4, 19.85, 58.75]) rotate([90, 0, 0]) pin_washer();
  color([0.85, 0.48, 0.18]) translate([26.4, 27.1, 58.75]) rotate([90, 0, 0]) lock_nut();
  color([0.55, 0.60, 0.65]) translate([-36, -16.8, 8.25]) rotate([0, 0, 0]) guide_bush_a();
  color([0.75, 0.30, 0.55]) translate([-36, 16.8, 8.25]) rotate([0, 0, 0]) guide_bush_b();
}

assembly();
